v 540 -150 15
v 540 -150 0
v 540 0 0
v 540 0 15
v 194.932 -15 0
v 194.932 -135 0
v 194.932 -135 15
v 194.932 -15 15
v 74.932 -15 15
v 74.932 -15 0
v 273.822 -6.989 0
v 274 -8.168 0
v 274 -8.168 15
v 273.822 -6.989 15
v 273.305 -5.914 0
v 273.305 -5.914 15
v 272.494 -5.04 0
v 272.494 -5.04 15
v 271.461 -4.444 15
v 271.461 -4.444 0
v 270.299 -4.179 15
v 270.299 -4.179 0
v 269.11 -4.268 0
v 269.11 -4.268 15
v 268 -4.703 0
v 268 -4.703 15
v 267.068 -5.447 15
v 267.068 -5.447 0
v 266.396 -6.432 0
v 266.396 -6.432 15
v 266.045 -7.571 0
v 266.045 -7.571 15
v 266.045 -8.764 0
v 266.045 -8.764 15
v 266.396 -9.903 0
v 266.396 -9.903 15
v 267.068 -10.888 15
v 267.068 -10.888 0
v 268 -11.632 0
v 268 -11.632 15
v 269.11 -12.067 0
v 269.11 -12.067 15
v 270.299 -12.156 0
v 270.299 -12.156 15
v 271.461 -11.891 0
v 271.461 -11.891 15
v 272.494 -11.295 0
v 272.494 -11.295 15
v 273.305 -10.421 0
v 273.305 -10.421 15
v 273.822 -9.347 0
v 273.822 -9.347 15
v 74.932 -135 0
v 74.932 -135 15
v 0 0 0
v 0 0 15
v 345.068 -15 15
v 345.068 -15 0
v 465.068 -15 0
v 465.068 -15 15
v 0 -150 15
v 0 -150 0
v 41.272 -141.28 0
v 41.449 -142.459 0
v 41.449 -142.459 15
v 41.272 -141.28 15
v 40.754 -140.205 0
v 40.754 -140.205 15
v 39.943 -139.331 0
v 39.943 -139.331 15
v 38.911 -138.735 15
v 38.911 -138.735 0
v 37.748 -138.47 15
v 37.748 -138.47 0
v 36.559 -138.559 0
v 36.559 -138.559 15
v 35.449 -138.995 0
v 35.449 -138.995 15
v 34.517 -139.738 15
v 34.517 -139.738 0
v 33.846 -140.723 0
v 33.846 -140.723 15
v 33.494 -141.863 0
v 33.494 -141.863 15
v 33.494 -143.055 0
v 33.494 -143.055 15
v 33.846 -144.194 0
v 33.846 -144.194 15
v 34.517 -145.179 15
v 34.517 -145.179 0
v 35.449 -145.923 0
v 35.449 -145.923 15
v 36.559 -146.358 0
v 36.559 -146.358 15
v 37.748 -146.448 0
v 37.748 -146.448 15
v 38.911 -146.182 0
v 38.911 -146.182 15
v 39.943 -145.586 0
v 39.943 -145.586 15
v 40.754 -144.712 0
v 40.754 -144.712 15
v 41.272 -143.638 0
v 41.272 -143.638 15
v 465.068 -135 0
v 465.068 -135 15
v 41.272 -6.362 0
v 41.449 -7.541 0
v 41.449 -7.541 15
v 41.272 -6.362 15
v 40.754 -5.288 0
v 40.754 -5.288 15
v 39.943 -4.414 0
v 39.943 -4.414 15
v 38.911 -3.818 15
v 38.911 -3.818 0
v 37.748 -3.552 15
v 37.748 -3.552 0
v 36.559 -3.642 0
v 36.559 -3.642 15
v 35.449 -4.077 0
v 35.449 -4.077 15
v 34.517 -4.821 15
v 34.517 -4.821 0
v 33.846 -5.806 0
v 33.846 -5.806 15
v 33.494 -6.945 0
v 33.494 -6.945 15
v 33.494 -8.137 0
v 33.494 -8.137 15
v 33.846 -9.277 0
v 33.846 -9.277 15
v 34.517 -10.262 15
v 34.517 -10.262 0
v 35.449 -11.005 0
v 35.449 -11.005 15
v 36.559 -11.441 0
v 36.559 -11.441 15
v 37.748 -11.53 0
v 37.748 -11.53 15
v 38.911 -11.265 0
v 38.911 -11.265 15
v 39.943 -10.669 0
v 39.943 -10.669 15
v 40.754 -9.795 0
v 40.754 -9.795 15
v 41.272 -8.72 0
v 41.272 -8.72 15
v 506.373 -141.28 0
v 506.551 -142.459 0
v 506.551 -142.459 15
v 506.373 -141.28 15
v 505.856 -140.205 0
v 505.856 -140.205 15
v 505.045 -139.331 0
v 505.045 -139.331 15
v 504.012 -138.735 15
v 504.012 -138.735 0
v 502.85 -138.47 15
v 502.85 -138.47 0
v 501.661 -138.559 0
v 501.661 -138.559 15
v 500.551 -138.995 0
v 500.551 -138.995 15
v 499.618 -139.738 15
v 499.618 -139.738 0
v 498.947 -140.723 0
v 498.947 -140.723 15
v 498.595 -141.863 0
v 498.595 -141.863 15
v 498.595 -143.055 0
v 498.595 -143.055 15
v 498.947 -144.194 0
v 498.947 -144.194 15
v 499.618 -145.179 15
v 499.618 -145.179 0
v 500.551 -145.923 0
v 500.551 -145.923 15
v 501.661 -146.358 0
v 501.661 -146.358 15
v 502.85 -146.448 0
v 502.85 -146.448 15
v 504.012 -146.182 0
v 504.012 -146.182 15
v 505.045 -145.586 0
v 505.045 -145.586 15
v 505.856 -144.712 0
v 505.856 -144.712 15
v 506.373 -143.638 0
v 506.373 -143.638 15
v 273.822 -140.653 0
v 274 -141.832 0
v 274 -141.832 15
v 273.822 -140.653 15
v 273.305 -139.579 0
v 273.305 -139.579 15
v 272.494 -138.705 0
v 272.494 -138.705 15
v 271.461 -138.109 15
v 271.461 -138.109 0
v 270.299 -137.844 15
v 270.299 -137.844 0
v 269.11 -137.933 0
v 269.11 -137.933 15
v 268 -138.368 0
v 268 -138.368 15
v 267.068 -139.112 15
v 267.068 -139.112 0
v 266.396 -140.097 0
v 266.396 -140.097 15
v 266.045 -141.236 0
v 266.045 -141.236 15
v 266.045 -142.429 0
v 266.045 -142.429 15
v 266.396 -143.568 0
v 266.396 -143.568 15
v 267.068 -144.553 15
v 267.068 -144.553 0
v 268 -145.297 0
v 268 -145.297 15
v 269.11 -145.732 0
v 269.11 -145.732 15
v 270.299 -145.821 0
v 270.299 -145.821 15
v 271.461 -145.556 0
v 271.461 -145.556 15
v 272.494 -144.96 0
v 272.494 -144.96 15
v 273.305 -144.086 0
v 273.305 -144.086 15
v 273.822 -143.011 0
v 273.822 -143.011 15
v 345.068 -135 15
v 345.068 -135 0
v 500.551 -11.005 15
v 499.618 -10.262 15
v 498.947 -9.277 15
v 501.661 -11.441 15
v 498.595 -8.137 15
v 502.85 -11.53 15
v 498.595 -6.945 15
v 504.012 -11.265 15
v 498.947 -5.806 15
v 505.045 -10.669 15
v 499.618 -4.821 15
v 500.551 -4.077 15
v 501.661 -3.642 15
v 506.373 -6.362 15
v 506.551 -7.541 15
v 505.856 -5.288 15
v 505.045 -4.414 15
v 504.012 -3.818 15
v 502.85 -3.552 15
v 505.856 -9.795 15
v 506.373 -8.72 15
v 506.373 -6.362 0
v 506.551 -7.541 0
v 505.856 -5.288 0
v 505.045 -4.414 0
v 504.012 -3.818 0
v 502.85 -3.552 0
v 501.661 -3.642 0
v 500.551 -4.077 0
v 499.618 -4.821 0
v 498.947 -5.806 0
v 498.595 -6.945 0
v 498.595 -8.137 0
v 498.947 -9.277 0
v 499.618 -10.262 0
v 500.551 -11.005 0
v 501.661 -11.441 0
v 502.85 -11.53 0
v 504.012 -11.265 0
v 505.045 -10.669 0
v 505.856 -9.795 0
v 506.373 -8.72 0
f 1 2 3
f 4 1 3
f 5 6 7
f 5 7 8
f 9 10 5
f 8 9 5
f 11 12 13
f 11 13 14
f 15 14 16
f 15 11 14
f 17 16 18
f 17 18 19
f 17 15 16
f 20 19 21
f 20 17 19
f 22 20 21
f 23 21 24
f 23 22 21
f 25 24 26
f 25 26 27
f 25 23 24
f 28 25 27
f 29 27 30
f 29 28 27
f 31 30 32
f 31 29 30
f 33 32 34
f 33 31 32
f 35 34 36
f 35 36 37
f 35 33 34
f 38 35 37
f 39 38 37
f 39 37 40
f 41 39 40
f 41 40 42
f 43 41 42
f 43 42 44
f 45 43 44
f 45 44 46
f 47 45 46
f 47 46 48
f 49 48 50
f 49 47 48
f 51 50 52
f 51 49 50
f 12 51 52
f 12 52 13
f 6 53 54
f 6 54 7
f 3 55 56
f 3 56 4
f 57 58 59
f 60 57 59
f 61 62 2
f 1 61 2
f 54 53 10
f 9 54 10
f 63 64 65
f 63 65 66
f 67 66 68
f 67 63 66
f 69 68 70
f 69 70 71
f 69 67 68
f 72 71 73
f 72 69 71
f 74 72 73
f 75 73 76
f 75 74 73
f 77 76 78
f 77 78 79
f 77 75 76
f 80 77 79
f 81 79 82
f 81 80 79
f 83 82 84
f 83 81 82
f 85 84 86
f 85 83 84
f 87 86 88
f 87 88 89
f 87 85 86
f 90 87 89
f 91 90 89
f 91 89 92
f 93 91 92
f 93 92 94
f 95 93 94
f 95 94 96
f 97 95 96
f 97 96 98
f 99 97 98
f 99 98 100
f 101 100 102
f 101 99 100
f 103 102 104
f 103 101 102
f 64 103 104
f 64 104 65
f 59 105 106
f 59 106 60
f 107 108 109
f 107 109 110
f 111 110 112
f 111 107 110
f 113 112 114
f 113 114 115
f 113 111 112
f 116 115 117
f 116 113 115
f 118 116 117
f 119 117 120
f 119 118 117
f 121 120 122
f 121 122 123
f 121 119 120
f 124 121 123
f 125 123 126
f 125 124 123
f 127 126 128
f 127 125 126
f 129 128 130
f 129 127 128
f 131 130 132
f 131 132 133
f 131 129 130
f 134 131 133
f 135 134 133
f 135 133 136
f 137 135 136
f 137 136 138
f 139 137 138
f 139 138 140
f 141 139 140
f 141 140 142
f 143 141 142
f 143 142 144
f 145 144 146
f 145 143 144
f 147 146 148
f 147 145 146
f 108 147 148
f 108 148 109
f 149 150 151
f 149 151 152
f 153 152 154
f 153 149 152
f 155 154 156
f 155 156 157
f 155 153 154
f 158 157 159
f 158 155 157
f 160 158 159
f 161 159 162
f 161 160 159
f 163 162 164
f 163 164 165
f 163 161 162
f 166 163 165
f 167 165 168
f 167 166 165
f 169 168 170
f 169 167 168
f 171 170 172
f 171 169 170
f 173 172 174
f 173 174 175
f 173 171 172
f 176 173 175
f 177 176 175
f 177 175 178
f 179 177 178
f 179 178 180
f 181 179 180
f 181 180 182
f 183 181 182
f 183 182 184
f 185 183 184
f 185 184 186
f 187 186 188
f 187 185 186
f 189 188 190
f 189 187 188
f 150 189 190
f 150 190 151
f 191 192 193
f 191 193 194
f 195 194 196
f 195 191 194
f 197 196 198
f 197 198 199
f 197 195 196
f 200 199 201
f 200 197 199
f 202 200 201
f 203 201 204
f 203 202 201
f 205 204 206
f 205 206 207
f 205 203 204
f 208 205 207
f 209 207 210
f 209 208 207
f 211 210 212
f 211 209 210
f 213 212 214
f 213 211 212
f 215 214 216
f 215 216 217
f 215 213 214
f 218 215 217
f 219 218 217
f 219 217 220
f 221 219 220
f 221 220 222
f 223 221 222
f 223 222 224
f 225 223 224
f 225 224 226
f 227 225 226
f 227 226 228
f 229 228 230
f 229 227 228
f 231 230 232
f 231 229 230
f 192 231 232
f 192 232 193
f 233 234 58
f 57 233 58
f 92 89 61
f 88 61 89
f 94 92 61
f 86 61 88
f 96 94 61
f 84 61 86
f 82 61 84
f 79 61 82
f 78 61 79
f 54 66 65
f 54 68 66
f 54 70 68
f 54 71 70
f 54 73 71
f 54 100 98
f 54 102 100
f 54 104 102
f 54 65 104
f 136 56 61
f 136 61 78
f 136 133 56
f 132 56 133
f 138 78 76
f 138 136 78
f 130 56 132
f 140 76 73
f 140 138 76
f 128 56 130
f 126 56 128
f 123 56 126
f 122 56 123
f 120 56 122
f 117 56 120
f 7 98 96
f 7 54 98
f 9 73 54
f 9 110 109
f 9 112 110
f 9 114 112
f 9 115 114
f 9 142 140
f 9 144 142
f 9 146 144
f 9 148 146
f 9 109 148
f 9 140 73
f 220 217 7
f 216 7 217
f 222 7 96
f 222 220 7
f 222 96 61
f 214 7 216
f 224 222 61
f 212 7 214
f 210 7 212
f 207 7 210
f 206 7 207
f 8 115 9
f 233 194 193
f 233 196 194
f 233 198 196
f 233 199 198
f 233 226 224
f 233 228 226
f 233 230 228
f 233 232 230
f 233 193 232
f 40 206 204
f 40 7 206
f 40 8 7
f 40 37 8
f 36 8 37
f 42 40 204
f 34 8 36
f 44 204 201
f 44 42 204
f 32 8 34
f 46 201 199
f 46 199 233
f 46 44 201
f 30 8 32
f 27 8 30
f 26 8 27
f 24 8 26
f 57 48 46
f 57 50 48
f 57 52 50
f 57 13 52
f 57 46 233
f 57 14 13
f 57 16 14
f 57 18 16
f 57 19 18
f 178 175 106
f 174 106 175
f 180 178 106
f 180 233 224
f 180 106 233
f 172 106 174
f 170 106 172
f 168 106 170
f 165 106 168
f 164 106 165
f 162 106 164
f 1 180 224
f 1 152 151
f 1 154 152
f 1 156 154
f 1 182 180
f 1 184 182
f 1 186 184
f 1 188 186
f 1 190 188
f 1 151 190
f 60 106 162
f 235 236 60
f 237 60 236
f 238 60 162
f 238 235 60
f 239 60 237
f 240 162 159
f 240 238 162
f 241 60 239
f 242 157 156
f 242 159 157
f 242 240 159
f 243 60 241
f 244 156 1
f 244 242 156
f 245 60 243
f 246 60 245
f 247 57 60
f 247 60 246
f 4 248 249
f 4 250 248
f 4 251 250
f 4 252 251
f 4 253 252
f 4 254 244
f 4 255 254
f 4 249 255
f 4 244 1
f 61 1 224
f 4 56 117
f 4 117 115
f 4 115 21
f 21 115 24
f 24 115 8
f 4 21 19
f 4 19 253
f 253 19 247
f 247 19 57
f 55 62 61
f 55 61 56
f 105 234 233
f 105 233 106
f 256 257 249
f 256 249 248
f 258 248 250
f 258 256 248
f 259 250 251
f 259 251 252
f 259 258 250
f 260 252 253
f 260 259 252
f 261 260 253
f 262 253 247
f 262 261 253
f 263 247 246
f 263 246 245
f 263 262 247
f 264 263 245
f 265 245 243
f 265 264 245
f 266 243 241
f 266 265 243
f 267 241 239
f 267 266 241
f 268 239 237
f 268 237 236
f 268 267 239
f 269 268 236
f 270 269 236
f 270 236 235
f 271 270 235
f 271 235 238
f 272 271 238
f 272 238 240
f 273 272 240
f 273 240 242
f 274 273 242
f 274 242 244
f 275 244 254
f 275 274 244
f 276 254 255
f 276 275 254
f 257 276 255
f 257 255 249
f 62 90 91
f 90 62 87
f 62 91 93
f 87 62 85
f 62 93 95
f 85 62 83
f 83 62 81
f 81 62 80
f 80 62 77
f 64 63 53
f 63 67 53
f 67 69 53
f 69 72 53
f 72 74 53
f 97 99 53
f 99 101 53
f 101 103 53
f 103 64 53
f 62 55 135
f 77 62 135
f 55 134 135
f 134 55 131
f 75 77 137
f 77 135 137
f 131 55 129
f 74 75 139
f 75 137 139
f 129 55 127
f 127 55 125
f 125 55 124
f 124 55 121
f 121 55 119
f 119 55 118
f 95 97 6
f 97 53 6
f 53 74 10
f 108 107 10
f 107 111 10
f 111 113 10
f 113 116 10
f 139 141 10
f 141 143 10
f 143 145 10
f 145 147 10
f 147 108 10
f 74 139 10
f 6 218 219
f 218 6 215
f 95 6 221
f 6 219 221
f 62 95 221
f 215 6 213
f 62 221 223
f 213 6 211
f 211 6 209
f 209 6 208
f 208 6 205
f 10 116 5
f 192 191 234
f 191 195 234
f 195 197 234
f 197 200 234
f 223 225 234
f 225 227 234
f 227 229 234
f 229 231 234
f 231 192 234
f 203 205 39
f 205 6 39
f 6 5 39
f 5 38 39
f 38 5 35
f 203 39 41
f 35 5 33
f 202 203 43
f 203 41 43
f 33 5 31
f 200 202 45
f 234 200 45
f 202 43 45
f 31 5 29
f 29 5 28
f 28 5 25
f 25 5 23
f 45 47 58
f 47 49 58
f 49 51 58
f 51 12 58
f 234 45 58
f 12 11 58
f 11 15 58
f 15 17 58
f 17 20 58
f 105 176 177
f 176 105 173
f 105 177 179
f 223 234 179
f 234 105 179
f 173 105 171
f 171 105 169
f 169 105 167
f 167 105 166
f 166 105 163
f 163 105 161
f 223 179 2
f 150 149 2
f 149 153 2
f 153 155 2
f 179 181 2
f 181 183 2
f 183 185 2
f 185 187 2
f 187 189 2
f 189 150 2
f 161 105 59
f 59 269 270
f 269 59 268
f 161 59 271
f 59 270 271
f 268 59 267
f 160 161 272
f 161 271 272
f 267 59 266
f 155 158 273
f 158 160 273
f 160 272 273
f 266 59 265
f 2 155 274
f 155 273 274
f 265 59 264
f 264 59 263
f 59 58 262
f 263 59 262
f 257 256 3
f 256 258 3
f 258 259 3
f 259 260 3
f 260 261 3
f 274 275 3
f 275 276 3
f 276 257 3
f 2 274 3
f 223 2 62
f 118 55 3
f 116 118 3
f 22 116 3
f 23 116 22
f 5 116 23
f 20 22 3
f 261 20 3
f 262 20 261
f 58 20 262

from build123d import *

# Parameters (mm, degrees)
F0_W     = 540
F0_H     = 150
F0_R     = 4
F0_W_2   = 120
F0_H_2   = 120
F1_DEPTH = 15


with BuildPart() as f1:
    # F0 (on Top) → F1 (new body)
    with BuildSketch(Plane.XY):
        with Locations((270, -75)):
            Rectangle(F0_W, F0_H)
        with Locations((37.449412, -142.458765)):
            Circle(F0_R, mode=Mode.SUBTRACT)
        with Locations((270, -141.832436)):
            Circle(F0_R, mode=Mode.SUBTRACT)
        with Locations((502.550588, -142.458765)):
            Circle(F0_R, mode=Mode.SUBTRACT)
        with Locations((134.932024, -75)):
            Rectangle(F0_W_2, F0_H_2, mode=Mode.SUBTRACT)
        with Locations((37.449412, -7.541235)):
            Circle(F0_R, mode=Mode.SUBTRACT)
        with Locations((405.067976, -75)):
            Rectangle(F0_W_2, F0_H_2, mode=Mode.SUBTRACT)
        with Locations((270, -8.167564)):
            Circle(F0_R, mode=Mode.SUBTRACT)
        with Locations((502.550588, -7.541235)):
            Circle(F0_R, mode=Mode.SUBTRACT)
    extrude(amount=F1_DEPTH)


solid = f1.part
